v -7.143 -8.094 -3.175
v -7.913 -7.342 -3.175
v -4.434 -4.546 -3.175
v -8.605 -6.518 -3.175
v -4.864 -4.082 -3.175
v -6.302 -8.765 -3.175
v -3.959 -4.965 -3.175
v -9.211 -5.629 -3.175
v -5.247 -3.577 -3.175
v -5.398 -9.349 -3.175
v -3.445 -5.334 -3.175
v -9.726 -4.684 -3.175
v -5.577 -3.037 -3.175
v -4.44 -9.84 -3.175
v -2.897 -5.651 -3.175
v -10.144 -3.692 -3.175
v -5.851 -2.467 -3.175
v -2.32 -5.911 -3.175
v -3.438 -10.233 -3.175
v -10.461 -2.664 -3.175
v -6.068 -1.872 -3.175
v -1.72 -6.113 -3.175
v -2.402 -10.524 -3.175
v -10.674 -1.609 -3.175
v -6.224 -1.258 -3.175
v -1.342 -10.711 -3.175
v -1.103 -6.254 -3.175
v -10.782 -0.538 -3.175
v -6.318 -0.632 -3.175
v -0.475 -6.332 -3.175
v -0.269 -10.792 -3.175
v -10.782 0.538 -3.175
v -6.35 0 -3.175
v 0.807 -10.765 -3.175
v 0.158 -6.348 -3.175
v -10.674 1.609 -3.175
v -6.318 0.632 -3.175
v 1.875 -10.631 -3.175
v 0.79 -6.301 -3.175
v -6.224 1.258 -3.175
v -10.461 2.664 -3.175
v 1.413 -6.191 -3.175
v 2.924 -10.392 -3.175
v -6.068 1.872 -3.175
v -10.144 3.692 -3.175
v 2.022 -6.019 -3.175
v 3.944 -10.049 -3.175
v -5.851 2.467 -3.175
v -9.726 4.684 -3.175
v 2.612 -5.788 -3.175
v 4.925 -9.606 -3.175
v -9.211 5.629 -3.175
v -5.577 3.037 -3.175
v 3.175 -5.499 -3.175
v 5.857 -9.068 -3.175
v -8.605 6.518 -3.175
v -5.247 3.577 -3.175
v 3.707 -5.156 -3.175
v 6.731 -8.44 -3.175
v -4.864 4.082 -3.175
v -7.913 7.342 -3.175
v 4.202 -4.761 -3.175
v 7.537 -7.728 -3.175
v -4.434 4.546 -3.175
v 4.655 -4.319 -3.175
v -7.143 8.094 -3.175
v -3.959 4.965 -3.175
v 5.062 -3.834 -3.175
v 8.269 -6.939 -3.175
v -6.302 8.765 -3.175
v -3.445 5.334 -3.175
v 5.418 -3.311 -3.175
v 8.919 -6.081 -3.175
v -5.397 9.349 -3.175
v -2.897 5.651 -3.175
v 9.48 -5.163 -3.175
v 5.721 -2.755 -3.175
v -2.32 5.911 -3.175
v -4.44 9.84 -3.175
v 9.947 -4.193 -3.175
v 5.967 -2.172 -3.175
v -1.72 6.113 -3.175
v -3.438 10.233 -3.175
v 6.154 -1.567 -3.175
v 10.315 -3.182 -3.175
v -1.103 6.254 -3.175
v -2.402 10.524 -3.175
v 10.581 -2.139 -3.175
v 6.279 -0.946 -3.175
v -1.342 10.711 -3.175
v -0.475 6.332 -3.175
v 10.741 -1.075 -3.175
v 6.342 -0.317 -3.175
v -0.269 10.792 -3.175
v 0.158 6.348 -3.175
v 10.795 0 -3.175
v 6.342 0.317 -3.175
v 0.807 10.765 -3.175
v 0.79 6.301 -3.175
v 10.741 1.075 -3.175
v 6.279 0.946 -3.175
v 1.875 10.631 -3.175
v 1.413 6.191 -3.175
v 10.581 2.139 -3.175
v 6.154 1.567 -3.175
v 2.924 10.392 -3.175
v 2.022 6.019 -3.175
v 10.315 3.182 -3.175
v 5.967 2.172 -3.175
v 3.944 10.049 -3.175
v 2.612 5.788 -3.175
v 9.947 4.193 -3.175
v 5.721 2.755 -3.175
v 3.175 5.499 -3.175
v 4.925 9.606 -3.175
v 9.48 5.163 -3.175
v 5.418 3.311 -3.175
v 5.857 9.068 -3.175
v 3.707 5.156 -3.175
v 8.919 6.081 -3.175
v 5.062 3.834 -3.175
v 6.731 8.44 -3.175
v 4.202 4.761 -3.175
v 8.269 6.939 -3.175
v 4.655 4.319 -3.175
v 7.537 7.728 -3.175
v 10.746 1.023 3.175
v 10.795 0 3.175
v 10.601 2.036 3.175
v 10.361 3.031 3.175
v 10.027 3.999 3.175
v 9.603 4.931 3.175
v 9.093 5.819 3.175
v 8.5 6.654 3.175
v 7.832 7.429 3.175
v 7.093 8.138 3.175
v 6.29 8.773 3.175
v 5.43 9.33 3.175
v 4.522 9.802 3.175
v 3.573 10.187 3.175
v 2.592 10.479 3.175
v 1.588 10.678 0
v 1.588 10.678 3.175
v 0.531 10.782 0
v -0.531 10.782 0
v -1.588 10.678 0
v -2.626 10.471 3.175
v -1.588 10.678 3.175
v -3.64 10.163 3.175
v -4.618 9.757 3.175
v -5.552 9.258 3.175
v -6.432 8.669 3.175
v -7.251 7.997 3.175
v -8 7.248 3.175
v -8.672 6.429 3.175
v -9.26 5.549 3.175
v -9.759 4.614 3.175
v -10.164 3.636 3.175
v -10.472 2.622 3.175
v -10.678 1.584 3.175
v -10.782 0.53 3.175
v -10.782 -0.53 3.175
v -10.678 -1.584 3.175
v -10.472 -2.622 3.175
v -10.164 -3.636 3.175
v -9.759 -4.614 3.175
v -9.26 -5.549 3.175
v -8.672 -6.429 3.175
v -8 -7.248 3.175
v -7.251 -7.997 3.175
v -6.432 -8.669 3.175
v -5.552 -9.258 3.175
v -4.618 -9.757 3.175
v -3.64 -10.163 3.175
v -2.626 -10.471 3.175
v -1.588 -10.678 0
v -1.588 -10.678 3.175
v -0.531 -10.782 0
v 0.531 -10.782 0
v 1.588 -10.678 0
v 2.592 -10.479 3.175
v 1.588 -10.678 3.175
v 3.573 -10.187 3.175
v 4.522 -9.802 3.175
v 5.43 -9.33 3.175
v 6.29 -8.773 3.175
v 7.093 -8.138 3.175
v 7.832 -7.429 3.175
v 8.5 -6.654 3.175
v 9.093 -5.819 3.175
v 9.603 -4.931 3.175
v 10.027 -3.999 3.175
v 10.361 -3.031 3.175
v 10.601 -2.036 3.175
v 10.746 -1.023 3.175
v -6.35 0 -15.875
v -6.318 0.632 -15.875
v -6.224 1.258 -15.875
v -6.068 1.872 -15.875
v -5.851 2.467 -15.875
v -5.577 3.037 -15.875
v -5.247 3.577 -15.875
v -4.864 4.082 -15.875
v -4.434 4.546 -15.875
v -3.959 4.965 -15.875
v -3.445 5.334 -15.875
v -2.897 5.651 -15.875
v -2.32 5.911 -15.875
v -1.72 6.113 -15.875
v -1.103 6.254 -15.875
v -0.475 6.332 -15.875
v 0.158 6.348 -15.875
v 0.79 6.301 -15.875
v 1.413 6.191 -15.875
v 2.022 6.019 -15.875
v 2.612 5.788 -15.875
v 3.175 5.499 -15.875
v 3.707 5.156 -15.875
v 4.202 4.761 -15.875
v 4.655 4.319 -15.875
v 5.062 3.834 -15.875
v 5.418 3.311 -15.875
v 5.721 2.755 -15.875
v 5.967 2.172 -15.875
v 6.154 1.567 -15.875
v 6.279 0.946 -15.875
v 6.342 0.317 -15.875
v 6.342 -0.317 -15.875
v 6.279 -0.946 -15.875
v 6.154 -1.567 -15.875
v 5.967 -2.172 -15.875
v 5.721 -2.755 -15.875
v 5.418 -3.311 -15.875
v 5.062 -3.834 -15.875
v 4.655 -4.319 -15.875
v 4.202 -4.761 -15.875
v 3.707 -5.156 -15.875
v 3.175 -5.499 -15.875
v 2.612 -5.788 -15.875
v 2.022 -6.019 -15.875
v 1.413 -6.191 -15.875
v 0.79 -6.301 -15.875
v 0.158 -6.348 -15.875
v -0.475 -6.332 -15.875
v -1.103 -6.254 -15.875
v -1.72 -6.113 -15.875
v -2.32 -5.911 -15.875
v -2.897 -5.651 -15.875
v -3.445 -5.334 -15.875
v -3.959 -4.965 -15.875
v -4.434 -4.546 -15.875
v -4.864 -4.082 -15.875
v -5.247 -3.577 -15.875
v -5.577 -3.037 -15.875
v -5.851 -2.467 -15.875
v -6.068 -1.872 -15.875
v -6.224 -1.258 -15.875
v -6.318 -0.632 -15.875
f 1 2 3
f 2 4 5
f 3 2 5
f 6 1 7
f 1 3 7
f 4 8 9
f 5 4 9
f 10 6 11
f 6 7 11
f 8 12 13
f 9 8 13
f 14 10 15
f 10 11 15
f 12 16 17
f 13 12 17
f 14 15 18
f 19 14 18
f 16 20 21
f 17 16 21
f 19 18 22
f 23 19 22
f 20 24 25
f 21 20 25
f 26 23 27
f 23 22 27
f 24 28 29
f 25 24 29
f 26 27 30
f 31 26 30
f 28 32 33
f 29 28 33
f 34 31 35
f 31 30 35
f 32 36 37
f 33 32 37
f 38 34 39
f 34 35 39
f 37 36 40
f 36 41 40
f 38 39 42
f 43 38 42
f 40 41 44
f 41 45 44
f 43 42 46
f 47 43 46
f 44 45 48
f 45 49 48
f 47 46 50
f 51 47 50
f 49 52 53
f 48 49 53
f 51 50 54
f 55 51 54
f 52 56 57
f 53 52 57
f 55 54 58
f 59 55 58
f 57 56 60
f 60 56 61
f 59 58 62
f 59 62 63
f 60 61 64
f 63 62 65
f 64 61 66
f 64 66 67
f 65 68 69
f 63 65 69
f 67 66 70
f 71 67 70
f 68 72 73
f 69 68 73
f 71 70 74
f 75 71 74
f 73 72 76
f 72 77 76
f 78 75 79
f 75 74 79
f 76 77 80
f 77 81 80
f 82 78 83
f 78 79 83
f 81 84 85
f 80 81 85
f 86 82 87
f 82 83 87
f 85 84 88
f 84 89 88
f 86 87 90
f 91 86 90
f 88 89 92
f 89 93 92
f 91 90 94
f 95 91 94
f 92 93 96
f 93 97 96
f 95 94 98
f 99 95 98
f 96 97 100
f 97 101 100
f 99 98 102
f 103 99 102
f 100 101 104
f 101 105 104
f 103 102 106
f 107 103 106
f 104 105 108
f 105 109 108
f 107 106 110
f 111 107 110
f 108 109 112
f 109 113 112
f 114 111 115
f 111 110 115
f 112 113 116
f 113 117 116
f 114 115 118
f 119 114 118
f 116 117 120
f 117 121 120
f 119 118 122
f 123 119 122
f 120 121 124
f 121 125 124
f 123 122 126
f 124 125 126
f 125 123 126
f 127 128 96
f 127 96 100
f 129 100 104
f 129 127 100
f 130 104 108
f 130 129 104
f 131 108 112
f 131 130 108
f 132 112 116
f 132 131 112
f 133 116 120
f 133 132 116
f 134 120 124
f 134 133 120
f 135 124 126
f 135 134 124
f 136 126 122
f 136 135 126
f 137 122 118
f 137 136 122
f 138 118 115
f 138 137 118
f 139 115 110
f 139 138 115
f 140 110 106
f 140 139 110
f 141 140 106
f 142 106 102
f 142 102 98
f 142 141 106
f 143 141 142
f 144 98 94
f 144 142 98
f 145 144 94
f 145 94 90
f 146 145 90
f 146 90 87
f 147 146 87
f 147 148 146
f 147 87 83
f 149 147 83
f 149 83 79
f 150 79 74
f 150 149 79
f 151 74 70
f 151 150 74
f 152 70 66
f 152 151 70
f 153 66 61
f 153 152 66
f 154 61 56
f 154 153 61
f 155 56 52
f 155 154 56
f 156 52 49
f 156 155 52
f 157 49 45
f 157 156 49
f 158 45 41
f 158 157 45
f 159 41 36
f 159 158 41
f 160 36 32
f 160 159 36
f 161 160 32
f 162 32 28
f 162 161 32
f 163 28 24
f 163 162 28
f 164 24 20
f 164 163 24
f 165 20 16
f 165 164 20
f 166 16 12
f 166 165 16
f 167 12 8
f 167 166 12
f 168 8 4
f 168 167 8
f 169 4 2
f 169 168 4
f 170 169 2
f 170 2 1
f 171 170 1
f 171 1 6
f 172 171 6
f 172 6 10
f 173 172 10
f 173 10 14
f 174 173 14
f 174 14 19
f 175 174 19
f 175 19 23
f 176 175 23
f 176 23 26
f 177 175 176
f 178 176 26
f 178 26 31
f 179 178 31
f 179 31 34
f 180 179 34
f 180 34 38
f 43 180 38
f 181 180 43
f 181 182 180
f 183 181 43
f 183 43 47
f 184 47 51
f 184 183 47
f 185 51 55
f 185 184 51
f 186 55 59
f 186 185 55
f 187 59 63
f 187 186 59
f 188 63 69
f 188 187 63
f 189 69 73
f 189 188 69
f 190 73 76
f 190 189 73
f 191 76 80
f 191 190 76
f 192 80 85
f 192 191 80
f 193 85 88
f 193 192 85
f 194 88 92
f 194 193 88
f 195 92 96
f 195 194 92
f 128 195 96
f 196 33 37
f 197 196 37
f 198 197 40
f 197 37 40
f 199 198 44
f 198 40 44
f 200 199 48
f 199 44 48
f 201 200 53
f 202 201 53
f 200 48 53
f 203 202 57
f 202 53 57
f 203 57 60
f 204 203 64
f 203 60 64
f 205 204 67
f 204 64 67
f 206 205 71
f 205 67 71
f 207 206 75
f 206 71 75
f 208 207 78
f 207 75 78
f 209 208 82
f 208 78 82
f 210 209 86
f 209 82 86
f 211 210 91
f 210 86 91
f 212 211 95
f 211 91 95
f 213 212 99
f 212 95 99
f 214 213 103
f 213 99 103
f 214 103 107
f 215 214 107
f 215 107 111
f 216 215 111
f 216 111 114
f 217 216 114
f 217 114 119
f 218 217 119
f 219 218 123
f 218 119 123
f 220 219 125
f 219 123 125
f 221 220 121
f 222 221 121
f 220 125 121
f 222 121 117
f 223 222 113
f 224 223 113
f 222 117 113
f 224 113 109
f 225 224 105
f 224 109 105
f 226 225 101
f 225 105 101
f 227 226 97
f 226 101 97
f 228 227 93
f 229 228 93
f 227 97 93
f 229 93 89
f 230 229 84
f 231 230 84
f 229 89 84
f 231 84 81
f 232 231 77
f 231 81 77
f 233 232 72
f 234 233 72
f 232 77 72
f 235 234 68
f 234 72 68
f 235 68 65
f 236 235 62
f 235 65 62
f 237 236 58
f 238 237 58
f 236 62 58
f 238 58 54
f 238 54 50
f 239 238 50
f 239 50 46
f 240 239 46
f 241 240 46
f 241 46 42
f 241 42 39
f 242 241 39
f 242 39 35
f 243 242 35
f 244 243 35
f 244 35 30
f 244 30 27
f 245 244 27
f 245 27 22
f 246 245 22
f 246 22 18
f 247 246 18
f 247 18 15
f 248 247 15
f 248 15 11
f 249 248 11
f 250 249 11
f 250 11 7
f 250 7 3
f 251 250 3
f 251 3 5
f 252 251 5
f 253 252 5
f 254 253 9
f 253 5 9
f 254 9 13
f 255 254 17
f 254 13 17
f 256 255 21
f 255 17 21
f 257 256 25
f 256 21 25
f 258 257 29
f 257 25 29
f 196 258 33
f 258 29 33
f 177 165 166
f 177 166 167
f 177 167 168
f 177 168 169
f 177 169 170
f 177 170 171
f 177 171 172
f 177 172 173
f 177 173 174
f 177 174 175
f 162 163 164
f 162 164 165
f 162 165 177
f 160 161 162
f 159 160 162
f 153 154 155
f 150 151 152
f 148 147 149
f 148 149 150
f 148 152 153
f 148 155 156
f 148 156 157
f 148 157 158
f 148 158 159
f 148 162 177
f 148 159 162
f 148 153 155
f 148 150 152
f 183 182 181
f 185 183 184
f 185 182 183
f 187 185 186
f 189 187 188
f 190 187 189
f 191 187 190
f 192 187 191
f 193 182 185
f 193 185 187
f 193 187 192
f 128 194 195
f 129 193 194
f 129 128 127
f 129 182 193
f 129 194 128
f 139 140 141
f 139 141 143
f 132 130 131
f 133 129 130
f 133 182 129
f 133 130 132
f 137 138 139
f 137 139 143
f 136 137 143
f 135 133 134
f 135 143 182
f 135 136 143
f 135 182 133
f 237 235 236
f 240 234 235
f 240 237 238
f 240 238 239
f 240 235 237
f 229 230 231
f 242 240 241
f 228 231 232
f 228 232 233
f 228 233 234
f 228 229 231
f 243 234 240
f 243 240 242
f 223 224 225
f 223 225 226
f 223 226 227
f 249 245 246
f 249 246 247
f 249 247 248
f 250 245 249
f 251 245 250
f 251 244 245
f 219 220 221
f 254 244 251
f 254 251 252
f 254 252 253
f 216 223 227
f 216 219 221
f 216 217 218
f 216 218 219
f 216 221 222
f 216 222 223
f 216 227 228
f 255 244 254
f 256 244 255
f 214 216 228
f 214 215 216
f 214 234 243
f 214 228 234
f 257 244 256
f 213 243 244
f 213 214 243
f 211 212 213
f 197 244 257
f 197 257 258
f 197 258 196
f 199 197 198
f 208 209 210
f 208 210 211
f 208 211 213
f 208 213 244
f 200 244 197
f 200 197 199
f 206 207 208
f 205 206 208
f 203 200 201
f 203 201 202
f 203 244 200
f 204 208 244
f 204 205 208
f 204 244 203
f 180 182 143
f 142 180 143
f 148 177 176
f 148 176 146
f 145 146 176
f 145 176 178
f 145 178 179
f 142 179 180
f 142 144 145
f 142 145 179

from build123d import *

# Parameters (mm, degrees)
SKETCH1_R           = 10.795
BOSS_EXTRUDE1_DEPTH = 3.175
SKETCH2_R           = 6.35
BOSS_EXTRUDE2_DEPTH = 12.7
SKETCH3_W           = 3.175
SKETCH3_H           = 25.4
CUT_EXTRUDE1_DEPTH  = 3.175


with BuildPart() as part:
    # Sketch1 → Boss-Extrude1 (new, symmetric)
    with BuildSketch(Plane.XY):
        Circle(SKETCH1_R)
    extrude(amount=BOSS_EXTRUDE1_DEPTH, both=True)

    # Sketch2 → Boss-Extrude2 (add)
    with BuildSketch(Plane(origin=(0, 0, -3.175), x_dir=(-1, 0, 0), z_dir=(0, 0, -1))):
        Circle(SKETCH2_R)
    extrude(amount=BOSS_EXTRUDE2_DEPTH)

    # Sketch3 → Cut-Extrude1 (cut)
    with BuildSketch(Plane.XY.offset(3.175)):
        Rectangle(SKETCH3_W, SKETCH3_H)
    extrude(amount=-CUT_EXTRUDE1_DEPTH, mode=Mode.SUBTRACT)


solid = part.part
